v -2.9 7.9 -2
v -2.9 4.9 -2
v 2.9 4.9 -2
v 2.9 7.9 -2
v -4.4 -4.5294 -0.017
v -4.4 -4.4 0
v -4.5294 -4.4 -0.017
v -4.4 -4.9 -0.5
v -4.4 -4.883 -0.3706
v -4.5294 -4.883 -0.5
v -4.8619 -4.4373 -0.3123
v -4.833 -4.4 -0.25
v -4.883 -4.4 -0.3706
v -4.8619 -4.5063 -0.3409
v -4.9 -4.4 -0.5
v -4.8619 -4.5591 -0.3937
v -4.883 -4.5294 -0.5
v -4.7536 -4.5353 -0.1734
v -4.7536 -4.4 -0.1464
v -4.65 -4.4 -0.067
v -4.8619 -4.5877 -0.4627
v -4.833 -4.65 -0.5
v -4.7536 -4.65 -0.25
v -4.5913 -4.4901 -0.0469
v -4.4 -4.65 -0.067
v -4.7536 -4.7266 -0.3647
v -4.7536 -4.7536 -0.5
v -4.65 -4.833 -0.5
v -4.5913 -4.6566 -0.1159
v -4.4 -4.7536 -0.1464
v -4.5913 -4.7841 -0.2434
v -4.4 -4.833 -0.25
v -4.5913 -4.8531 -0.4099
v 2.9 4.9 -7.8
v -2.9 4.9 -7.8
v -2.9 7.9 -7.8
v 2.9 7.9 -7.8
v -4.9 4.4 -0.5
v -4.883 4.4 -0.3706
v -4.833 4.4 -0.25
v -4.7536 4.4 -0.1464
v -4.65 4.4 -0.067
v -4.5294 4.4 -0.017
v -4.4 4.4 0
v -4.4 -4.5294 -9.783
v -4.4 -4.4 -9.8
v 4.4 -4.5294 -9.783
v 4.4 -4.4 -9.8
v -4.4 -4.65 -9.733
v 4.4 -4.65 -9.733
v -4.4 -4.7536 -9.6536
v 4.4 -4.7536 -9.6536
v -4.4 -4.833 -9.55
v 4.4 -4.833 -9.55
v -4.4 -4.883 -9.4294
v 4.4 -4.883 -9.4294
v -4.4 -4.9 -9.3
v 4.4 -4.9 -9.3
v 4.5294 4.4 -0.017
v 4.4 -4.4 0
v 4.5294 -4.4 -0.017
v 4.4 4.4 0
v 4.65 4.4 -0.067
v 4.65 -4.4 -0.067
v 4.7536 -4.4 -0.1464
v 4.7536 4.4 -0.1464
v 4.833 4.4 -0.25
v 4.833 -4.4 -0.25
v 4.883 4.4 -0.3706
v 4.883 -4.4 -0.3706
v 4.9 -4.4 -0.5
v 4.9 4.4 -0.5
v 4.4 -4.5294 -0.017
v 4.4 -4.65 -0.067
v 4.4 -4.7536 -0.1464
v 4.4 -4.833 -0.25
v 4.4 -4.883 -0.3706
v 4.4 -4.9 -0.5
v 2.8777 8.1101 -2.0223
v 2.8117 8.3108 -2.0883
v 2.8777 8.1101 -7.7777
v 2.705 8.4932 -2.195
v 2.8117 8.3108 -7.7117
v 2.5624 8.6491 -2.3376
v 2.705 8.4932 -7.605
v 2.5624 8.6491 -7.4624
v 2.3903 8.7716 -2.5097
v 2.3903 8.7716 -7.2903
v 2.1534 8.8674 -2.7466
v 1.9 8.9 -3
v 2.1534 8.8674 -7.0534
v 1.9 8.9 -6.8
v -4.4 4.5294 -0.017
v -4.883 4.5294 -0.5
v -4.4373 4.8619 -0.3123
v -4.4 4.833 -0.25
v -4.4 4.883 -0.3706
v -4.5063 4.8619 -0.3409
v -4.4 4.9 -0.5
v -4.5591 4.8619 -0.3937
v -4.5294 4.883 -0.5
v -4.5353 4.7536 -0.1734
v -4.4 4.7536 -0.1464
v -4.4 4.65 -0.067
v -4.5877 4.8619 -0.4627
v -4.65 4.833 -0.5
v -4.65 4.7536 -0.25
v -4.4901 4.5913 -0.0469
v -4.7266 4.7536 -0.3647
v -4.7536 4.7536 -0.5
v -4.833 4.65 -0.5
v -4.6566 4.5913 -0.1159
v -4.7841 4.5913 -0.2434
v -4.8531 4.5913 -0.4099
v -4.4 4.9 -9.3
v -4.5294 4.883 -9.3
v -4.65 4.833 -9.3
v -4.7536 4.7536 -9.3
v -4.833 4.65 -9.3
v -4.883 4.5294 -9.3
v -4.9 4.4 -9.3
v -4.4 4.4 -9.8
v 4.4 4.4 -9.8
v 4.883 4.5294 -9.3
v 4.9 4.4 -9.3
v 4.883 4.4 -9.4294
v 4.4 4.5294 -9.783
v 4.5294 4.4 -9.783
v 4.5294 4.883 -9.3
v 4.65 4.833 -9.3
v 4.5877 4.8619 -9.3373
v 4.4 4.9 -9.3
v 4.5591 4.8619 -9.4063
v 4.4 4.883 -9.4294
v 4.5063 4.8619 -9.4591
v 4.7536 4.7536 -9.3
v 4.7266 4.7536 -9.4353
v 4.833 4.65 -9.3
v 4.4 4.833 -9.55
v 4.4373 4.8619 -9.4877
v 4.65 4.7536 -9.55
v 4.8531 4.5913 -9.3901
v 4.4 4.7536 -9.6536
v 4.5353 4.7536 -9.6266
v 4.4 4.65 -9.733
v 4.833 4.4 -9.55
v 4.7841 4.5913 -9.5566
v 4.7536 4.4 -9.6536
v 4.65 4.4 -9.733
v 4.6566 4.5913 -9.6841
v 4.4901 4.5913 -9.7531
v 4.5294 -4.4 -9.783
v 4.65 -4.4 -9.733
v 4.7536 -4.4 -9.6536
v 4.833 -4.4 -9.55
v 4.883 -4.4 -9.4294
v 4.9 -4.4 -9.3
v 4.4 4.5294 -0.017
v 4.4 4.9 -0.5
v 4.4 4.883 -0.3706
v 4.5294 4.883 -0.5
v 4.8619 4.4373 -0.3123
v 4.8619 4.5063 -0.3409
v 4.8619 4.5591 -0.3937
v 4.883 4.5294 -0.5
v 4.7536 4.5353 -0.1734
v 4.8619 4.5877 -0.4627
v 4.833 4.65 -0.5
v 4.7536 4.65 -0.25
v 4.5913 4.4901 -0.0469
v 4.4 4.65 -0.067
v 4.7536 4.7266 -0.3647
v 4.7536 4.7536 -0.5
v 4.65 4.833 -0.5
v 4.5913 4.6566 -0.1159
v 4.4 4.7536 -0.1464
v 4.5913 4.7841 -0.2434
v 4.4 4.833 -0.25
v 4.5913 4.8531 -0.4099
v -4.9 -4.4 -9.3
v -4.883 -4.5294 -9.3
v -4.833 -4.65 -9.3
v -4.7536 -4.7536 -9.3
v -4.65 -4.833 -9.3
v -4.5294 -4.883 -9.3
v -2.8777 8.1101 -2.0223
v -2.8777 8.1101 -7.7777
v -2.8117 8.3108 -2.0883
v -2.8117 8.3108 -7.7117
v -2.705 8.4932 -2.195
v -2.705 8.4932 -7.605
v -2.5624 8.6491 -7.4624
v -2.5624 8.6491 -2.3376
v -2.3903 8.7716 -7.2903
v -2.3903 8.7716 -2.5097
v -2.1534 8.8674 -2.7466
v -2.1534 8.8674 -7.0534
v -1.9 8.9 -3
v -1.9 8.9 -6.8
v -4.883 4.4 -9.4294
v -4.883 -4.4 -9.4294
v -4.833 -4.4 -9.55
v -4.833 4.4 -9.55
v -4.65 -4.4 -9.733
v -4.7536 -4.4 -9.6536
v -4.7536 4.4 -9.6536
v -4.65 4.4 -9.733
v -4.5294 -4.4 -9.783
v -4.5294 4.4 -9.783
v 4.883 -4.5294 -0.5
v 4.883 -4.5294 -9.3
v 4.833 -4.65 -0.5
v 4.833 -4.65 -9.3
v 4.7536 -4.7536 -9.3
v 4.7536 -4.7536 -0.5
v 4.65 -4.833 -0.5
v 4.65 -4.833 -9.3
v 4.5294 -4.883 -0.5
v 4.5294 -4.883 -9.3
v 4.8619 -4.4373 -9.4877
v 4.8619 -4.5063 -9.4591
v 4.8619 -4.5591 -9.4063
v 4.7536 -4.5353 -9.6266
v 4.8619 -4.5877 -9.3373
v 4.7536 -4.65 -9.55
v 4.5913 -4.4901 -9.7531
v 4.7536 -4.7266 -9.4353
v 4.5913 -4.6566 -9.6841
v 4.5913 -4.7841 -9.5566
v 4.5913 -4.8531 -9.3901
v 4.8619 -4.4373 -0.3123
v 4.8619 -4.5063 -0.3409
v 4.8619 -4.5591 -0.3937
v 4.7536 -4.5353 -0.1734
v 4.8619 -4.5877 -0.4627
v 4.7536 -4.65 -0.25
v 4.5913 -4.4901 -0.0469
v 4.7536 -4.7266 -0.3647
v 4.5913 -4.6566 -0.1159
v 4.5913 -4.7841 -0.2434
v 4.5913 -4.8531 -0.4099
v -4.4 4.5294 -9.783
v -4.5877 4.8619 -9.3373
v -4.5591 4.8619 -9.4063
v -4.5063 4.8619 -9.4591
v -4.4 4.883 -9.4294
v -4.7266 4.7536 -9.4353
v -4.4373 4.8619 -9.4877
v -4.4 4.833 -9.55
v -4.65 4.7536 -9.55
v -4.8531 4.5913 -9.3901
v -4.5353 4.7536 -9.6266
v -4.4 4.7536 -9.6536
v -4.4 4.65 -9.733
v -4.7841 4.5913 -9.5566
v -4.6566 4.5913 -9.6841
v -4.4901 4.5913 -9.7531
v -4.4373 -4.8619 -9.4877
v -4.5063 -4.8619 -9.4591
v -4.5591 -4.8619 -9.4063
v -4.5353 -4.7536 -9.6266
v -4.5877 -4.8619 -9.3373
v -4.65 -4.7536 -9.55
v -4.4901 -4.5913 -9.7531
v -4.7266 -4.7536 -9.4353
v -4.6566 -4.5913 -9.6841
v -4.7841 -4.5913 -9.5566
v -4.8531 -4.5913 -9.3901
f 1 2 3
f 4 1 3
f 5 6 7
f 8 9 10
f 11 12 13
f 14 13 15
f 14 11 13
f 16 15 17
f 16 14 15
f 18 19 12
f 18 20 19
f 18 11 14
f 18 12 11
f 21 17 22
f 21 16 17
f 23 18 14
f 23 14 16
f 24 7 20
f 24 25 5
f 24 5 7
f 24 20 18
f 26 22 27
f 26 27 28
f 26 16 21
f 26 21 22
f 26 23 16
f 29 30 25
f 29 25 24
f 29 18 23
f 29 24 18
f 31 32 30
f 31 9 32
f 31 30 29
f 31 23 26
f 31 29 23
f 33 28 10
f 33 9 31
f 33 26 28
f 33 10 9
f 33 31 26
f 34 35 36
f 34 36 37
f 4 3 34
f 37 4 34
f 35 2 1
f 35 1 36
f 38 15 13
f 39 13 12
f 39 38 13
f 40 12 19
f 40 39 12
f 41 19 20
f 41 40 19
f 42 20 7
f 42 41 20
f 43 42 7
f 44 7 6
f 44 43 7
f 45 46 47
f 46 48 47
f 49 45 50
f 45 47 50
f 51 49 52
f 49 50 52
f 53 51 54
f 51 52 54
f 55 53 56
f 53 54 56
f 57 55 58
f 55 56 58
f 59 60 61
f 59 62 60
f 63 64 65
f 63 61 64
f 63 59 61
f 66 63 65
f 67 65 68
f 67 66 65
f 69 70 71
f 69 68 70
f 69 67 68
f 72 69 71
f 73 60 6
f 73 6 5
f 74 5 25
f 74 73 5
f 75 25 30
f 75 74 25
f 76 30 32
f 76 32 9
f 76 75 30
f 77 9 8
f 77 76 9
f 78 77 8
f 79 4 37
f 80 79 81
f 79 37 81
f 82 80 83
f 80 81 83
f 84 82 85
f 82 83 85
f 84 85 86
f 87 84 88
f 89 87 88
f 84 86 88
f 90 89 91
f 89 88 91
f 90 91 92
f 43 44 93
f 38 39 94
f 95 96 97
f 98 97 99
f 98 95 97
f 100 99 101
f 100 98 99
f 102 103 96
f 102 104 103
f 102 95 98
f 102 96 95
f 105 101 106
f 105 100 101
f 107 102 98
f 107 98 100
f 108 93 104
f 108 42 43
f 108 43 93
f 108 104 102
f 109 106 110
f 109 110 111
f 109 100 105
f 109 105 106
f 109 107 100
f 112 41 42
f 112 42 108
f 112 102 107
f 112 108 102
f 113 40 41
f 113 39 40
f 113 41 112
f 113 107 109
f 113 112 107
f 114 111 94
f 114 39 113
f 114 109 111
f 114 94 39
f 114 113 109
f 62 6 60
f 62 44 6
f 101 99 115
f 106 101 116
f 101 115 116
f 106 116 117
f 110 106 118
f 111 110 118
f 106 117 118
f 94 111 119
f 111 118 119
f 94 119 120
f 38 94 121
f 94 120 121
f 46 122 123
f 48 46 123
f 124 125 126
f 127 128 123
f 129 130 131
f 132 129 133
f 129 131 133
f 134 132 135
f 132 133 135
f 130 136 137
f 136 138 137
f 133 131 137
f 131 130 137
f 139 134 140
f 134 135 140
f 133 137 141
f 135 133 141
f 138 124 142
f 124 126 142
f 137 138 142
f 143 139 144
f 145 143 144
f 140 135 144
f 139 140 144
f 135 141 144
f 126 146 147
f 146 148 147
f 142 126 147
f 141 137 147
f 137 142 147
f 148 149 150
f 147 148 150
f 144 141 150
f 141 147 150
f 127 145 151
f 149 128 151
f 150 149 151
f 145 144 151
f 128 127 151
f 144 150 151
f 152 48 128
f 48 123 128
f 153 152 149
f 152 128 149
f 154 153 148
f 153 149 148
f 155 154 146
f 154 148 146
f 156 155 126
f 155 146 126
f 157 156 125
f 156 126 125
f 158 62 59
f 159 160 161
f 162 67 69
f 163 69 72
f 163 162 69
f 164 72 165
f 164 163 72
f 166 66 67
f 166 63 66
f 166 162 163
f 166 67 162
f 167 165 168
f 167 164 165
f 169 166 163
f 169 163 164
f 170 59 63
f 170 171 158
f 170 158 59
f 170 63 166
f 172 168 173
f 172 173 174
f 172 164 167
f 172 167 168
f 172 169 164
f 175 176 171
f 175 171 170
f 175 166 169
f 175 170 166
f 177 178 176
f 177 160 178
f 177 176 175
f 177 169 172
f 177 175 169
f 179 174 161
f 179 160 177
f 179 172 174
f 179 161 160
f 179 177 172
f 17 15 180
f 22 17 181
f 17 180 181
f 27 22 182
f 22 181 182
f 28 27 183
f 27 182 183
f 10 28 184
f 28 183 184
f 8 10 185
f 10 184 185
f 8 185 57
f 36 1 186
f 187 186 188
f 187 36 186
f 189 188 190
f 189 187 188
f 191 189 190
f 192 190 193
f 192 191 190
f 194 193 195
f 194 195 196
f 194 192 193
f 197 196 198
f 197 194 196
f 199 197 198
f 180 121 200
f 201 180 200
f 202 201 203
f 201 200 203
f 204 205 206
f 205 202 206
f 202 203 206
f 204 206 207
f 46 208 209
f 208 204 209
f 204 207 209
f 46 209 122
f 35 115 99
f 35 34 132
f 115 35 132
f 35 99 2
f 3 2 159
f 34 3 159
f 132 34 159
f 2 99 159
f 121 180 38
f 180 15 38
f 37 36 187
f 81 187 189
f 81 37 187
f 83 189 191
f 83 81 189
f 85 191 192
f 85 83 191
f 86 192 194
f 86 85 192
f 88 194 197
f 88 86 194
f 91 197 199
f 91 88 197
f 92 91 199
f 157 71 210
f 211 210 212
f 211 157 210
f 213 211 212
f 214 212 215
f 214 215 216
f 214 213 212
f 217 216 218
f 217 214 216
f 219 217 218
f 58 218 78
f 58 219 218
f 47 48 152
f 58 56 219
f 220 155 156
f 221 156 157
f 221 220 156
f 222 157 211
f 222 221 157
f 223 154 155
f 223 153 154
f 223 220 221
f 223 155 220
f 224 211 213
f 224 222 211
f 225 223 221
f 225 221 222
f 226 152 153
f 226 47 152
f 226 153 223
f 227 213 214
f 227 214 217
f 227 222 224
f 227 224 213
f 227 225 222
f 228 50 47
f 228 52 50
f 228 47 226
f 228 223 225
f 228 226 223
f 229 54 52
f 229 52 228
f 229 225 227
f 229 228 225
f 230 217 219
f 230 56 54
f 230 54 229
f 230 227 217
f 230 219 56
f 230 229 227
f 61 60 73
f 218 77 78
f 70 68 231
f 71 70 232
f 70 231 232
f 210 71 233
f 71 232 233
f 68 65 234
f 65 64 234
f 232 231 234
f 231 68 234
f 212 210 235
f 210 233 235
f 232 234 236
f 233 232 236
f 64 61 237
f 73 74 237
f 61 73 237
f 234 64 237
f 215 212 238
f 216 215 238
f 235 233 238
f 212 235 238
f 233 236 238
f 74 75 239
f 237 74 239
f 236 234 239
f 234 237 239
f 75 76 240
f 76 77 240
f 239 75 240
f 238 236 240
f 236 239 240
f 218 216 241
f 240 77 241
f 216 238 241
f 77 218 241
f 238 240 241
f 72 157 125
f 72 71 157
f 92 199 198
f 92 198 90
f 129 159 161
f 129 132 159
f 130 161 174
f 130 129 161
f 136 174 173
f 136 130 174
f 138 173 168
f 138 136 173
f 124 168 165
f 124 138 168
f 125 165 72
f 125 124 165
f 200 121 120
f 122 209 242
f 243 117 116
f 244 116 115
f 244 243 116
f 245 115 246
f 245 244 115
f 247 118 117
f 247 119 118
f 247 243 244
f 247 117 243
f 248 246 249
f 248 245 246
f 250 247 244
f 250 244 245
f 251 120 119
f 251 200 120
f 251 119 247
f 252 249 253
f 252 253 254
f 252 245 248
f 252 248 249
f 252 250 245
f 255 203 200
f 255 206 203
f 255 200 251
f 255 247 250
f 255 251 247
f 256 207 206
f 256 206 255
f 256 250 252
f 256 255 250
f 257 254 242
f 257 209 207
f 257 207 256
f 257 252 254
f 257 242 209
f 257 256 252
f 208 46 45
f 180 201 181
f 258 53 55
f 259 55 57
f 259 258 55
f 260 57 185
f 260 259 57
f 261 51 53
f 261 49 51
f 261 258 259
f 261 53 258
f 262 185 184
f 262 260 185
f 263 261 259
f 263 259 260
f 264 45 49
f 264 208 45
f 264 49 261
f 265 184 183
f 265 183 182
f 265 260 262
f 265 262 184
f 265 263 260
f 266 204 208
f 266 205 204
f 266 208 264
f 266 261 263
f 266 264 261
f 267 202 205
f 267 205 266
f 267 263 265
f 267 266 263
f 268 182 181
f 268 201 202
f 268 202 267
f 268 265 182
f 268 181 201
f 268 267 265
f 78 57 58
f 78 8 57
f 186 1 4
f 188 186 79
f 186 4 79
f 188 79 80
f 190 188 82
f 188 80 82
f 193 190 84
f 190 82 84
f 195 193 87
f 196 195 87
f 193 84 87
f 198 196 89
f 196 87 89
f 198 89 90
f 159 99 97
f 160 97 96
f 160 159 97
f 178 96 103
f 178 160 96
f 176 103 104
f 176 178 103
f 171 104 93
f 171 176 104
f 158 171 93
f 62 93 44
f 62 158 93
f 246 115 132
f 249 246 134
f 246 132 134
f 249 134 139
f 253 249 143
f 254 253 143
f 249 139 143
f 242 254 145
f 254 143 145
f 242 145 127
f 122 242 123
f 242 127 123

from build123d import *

# Parameters (mm, degrees)
SKETCH2_W           = 9.8
SKETCH2_H           = 9.8
BOSS_EXTRUDE1_DEPTH = 9.8
SKETCH3_W           = 5.8
SKETCH3_H           = 5.8
BOSS_EXTRUDE2_DEPTH = 4
FILLET3_R           = 1
FILLET4_R           = 0.5


with BuildPart() as part:
    # Sketch2 → Boss-Extrude1 (new body)
    with BuildSketch(Plane.XY):
        Rectangle(SKETCH2_W, SKETCH2_H)
    extrude(amount=-BOSS_EXTRUDE1_DEPTH)

    # Sketch3 → Boss-Extrude2 (add)
    with BuildSketch(Plane(origin=(0, 4.9, 0), x_dir=(1, 0, 0), z_dir=(0, 1, 0))):
        with Locations((0, 4.9)):
            Rectangle(SKETCH3_W, SKETCH3_H)
    extrude(amount=BOSS_EXTRUDE2_DEPTH)

    # Fillet3
    fillet3_edges = [part.edges().sort_by_distance(p)[0] for p in [
        (2.9, 8.9, -4.9),
        (0, 8.9, -7.8),
        (-2.9, 8.9, -4.9),
        (0, 8.9, -2),
    ]]
    fillet(fillet3_edges, radius=FILLET3_R)

    # Fillet4
    fillet4_edges = [part.edges().sort_by_distance(p)[0] for p in [
        (-4.9, 0, -9.8),
        (0, -4.9, -9.8),
        (4.9, 0, -9.8),
        (0, -4.9, 0),
        (-4.9, 0, 0),
        (0, 4.9, 0),
        (4.9, 0, 0),
        (4.9, -4.9, -4.9),
        (-4.9, -4.9, -4.9),
        (-4.9, 4.9, -4.9),
        (4.9, 4.9, -4.9),
        (0, 4.9, -9.8),
    ]]
    fillet(fillet4_edges, radius=FILLET4_R)


solid = part.part
